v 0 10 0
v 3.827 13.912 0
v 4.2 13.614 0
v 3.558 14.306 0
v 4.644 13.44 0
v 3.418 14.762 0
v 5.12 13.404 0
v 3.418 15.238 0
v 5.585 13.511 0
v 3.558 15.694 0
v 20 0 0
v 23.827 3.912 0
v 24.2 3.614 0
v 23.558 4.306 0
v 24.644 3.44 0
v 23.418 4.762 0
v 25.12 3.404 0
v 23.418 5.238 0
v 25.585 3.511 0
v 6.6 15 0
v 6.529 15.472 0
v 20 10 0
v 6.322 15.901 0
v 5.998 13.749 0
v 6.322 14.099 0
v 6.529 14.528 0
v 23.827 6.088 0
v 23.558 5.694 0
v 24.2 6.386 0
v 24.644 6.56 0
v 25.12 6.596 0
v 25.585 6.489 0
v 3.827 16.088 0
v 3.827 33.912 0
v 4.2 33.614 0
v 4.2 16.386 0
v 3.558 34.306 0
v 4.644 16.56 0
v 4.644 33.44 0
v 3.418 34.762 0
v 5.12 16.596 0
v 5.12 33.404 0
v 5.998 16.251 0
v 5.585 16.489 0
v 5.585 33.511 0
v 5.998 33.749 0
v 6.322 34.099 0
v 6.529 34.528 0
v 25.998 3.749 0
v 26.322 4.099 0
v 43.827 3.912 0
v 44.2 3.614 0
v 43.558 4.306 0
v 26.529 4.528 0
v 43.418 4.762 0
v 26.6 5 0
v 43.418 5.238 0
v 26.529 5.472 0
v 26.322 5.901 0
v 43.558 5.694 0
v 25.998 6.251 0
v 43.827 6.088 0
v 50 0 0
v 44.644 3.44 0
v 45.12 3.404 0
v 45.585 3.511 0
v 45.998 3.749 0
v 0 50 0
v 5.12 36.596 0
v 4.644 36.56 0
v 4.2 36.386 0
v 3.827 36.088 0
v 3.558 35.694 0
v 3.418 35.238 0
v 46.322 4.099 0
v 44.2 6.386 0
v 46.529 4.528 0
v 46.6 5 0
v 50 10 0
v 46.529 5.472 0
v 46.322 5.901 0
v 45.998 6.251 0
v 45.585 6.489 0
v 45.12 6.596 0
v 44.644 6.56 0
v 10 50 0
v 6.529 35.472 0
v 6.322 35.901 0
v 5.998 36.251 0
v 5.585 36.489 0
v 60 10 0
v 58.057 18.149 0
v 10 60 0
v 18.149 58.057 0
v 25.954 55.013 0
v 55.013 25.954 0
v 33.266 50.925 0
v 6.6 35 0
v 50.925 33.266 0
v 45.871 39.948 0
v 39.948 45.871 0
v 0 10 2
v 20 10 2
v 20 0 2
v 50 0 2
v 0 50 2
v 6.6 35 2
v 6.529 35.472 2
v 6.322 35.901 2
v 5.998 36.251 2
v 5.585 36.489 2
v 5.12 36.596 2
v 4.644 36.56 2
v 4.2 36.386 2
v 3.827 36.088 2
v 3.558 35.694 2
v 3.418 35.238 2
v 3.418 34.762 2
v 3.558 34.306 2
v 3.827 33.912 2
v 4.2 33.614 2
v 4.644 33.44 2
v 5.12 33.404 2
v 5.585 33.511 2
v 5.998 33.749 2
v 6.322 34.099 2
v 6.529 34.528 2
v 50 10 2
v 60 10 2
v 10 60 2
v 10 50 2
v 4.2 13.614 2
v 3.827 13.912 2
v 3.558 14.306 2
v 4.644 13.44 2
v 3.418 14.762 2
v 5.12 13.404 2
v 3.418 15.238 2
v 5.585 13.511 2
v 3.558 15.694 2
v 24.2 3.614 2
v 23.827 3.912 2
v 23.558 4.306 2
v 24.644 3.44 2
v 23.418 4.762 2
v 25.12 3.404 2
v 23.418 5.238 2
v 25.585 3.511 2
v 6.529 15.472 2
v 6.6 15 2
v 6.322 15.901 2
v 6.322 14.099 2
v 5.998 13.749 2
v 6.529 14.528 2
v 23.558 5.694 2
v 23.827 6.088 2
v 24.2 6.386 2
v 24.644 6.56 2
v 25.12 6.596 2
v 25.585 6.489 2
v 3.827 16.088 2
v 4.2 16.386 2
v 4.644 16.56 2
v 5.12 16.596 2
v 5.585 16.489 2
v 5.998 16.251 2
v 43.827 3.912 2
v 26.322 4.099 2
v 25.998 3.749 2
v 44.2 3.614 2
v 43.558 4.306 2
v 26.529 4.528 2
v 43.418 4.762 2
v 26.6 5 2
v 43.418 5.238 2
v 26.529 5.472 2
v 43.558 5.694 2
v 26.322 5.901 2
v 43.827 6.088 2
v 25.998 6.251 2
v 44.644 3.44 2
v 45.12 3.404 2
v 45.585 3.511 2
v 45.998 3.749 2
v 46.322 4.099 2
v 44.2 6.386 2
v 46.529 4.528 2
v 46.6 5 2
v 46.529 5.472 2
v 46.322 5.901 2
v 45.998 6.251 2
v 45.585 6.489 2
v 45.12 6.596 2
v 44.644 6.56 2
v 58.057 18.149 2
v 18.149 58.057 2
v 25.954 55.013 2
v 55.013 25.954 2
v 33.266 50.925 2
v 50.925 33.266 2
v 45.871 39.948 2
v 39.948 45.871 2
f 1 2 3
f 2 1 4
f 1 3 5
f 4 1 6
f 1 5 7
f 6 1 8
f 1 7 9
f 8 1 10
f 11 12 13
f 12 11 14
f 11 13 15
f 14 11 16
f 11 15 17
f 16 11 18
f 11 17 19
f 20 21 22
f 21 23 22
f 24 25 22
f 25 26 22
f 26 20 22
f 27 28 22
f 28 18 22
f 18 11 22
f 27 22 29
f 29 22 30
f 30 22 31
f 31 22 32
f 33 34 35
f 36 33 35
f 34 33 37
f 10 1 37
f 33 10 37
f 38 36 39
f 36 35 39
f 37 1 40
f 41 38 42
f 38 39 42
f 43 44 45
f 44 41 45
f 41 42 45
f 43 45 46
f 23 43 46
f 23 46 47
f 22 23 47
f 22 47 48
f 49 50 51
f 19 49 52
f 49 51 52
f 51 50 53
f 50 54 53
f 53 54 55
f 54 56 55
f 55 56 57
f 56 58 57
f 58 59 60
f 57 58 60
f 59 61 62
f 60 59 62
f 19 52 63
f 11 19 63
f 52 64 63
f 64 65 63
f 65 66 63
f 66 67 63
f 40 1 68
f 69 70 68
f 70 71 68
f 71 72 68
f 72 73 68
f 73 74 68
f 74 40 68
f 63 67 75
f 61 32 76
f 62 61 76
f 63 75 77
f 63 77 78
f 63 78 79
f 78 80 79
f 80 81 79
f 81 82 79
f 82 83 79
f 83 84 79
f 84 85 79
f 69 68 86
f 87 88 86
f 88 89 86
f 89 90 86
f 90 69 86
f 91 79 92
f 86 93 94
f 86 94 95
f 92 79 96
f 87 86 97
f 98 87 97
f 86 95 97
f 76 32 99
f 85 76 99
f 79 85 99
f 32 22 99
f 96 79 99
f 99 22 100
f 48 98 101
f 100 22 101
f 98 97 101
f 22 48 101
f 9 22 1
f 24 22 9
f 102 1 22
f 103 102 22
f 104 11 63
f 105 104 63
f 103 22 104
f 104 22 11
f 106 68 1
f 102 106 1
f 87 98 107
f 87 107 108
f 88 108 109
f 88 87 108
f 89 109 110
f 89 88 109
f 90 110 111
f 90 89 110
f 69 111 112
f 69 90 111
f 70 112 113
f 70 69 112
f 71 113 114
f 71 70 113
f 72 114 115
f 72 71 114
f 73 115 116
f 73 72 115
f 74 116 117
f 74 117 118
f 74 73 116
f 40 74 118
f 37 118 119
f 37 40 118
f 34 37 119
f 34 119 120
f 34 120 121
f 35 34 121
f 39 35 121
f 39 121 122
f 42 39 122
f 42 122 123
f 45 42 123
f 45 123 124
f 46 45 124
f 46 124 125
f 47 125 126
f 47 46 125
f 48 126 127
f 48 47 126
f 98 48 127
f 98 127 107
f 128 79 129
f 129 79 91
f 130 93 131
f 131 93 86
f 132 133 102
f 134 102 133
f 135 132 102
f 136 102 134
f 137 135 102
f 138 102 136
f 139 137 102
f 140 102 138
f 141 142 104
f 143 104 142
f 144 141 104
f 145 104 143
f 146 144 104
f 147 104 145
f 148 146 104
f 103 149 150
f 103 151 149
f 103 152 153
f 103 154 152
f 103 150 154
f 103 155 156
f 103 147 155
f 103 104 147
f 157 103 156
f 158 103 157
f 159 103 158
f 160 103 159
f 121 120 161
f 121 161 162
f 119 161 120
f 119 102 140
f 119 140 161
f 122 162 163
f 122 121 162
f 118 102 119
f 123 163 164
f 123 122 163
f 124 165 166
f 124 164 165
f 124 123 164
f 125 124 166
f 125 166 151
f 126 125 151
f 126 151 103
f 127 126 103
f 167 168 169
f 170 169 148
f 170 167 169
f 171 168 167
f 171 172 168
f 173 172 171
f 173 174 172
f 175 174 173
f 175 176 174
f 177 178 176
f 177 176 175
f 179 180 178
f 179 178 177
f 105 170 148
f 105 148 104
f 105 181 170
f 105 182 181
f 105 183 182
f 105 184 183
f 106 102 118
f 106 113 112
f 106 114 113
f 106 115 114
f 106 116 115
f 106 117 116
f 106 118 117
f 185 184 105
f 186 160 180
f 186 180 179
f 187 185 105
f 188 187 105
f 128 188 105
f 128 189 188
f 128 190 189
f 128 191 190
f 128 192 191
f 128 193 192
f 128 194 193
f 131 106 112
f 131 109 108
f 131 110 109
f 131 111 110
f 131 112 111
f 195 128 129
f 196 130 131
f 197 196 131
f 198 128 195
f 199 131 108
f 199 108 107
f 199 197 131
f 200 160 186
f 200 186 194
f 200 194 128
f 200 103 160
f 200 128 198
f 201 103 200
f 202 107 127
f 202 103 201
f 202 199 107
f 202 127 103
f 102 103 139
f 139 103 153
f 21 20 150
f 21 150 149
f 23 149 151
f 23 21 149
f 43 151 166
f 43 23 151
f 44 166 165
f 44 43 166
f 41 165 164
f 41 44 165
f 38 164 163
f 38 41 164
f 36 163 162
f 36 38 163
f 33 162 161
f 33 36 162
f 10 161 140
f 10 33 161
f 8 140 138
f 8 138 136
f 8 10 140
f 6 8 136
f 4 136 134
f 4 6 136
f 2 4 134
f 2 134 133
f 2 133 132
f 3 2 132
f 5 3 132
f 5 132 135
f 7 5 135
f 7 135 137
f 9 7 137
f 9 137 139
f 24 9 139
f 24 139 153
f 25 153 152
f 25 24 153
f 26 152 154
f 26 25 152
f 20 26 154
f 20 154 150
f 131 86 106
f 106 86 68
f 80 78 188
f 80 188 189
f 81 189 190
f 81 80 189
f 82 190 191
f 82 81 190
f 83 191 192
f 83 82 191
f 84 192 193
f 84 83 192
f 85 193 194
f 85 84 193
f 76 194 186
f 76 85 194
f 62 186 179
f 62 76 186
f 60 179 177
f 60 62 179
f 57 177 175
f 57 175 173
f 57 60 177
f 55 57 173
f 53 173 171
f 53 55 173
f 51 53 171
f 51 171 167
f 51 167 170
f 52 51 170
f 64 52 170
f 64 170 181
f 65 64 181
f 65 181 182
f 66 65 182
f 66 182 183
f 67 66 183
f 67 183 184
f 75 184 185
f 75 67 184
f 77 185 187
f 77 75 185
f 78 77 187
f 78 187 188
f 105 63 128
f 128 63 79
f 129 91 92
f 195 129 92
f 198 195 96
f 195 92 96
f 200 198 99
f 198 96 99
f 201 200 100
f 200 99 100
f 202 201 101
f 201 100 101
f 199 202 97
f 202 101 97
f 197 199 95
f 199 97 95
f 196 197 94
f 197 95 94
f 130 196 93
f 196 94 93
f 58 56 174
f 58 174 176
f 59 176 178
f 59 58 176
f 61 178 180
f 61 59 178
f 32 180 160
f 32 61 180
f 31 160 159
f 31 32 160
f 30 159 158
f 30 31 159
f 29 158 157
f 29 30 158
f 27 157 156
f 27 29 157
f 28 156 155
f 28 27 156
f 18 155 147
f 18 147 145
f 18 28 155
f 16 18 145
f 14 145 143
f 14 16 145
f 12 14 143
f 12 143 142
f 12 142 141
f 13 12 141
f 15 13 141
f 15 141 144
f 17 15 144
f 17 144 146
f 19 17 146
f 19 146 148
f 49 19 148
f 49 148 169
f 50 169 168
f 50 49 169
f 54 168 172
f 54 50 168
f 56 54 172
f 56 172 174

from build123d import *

# Parameters (mm, degrees)
SKETCH_1_R      = 1.6
EXTRUDE_1_DEPTH = 2


with BuildPart() as part:
    # ｽｹｯﾁ1 → ﾎﾞｽ - 押し出し1 (new body)
    with BuildSketch(Plane.XY):
        with BuildLine():
            Line((20, 0), (50, 0))
            Line((50, 0), (50, 10))
            Line((50, 10), (60, 10))
            ThreePointArc((60, 10), (43.011626335, 43.011626335), (10, 60))
            Line((10, 60), (10, 50))
            Line((10, 50), (0, 50))
            Line((0, 50), (0, 10))
            Line((0, 10), (20, 10))
            Line((20, 10), (20, 0))
        make_face()
        with Locations((5, 35)):
            Circle(SKETCH_1_R, mode=Mode.SUBTRACT)
        with Locations((5, 15)):
            Circle(SKETCH_1_R, mode=Mode.SUBTRACT)
        with Locations((25, 5)):
            Circle(SKETCH_1_R, mode=Mode.SUBTRACT)
        with Locations((45, 5)):
            Circle(SKETCH_1_R, mode=Mode.SUBTRACT)
    extrude(amount=EXTRUDE_1_DEPTH)


solid = part.part
